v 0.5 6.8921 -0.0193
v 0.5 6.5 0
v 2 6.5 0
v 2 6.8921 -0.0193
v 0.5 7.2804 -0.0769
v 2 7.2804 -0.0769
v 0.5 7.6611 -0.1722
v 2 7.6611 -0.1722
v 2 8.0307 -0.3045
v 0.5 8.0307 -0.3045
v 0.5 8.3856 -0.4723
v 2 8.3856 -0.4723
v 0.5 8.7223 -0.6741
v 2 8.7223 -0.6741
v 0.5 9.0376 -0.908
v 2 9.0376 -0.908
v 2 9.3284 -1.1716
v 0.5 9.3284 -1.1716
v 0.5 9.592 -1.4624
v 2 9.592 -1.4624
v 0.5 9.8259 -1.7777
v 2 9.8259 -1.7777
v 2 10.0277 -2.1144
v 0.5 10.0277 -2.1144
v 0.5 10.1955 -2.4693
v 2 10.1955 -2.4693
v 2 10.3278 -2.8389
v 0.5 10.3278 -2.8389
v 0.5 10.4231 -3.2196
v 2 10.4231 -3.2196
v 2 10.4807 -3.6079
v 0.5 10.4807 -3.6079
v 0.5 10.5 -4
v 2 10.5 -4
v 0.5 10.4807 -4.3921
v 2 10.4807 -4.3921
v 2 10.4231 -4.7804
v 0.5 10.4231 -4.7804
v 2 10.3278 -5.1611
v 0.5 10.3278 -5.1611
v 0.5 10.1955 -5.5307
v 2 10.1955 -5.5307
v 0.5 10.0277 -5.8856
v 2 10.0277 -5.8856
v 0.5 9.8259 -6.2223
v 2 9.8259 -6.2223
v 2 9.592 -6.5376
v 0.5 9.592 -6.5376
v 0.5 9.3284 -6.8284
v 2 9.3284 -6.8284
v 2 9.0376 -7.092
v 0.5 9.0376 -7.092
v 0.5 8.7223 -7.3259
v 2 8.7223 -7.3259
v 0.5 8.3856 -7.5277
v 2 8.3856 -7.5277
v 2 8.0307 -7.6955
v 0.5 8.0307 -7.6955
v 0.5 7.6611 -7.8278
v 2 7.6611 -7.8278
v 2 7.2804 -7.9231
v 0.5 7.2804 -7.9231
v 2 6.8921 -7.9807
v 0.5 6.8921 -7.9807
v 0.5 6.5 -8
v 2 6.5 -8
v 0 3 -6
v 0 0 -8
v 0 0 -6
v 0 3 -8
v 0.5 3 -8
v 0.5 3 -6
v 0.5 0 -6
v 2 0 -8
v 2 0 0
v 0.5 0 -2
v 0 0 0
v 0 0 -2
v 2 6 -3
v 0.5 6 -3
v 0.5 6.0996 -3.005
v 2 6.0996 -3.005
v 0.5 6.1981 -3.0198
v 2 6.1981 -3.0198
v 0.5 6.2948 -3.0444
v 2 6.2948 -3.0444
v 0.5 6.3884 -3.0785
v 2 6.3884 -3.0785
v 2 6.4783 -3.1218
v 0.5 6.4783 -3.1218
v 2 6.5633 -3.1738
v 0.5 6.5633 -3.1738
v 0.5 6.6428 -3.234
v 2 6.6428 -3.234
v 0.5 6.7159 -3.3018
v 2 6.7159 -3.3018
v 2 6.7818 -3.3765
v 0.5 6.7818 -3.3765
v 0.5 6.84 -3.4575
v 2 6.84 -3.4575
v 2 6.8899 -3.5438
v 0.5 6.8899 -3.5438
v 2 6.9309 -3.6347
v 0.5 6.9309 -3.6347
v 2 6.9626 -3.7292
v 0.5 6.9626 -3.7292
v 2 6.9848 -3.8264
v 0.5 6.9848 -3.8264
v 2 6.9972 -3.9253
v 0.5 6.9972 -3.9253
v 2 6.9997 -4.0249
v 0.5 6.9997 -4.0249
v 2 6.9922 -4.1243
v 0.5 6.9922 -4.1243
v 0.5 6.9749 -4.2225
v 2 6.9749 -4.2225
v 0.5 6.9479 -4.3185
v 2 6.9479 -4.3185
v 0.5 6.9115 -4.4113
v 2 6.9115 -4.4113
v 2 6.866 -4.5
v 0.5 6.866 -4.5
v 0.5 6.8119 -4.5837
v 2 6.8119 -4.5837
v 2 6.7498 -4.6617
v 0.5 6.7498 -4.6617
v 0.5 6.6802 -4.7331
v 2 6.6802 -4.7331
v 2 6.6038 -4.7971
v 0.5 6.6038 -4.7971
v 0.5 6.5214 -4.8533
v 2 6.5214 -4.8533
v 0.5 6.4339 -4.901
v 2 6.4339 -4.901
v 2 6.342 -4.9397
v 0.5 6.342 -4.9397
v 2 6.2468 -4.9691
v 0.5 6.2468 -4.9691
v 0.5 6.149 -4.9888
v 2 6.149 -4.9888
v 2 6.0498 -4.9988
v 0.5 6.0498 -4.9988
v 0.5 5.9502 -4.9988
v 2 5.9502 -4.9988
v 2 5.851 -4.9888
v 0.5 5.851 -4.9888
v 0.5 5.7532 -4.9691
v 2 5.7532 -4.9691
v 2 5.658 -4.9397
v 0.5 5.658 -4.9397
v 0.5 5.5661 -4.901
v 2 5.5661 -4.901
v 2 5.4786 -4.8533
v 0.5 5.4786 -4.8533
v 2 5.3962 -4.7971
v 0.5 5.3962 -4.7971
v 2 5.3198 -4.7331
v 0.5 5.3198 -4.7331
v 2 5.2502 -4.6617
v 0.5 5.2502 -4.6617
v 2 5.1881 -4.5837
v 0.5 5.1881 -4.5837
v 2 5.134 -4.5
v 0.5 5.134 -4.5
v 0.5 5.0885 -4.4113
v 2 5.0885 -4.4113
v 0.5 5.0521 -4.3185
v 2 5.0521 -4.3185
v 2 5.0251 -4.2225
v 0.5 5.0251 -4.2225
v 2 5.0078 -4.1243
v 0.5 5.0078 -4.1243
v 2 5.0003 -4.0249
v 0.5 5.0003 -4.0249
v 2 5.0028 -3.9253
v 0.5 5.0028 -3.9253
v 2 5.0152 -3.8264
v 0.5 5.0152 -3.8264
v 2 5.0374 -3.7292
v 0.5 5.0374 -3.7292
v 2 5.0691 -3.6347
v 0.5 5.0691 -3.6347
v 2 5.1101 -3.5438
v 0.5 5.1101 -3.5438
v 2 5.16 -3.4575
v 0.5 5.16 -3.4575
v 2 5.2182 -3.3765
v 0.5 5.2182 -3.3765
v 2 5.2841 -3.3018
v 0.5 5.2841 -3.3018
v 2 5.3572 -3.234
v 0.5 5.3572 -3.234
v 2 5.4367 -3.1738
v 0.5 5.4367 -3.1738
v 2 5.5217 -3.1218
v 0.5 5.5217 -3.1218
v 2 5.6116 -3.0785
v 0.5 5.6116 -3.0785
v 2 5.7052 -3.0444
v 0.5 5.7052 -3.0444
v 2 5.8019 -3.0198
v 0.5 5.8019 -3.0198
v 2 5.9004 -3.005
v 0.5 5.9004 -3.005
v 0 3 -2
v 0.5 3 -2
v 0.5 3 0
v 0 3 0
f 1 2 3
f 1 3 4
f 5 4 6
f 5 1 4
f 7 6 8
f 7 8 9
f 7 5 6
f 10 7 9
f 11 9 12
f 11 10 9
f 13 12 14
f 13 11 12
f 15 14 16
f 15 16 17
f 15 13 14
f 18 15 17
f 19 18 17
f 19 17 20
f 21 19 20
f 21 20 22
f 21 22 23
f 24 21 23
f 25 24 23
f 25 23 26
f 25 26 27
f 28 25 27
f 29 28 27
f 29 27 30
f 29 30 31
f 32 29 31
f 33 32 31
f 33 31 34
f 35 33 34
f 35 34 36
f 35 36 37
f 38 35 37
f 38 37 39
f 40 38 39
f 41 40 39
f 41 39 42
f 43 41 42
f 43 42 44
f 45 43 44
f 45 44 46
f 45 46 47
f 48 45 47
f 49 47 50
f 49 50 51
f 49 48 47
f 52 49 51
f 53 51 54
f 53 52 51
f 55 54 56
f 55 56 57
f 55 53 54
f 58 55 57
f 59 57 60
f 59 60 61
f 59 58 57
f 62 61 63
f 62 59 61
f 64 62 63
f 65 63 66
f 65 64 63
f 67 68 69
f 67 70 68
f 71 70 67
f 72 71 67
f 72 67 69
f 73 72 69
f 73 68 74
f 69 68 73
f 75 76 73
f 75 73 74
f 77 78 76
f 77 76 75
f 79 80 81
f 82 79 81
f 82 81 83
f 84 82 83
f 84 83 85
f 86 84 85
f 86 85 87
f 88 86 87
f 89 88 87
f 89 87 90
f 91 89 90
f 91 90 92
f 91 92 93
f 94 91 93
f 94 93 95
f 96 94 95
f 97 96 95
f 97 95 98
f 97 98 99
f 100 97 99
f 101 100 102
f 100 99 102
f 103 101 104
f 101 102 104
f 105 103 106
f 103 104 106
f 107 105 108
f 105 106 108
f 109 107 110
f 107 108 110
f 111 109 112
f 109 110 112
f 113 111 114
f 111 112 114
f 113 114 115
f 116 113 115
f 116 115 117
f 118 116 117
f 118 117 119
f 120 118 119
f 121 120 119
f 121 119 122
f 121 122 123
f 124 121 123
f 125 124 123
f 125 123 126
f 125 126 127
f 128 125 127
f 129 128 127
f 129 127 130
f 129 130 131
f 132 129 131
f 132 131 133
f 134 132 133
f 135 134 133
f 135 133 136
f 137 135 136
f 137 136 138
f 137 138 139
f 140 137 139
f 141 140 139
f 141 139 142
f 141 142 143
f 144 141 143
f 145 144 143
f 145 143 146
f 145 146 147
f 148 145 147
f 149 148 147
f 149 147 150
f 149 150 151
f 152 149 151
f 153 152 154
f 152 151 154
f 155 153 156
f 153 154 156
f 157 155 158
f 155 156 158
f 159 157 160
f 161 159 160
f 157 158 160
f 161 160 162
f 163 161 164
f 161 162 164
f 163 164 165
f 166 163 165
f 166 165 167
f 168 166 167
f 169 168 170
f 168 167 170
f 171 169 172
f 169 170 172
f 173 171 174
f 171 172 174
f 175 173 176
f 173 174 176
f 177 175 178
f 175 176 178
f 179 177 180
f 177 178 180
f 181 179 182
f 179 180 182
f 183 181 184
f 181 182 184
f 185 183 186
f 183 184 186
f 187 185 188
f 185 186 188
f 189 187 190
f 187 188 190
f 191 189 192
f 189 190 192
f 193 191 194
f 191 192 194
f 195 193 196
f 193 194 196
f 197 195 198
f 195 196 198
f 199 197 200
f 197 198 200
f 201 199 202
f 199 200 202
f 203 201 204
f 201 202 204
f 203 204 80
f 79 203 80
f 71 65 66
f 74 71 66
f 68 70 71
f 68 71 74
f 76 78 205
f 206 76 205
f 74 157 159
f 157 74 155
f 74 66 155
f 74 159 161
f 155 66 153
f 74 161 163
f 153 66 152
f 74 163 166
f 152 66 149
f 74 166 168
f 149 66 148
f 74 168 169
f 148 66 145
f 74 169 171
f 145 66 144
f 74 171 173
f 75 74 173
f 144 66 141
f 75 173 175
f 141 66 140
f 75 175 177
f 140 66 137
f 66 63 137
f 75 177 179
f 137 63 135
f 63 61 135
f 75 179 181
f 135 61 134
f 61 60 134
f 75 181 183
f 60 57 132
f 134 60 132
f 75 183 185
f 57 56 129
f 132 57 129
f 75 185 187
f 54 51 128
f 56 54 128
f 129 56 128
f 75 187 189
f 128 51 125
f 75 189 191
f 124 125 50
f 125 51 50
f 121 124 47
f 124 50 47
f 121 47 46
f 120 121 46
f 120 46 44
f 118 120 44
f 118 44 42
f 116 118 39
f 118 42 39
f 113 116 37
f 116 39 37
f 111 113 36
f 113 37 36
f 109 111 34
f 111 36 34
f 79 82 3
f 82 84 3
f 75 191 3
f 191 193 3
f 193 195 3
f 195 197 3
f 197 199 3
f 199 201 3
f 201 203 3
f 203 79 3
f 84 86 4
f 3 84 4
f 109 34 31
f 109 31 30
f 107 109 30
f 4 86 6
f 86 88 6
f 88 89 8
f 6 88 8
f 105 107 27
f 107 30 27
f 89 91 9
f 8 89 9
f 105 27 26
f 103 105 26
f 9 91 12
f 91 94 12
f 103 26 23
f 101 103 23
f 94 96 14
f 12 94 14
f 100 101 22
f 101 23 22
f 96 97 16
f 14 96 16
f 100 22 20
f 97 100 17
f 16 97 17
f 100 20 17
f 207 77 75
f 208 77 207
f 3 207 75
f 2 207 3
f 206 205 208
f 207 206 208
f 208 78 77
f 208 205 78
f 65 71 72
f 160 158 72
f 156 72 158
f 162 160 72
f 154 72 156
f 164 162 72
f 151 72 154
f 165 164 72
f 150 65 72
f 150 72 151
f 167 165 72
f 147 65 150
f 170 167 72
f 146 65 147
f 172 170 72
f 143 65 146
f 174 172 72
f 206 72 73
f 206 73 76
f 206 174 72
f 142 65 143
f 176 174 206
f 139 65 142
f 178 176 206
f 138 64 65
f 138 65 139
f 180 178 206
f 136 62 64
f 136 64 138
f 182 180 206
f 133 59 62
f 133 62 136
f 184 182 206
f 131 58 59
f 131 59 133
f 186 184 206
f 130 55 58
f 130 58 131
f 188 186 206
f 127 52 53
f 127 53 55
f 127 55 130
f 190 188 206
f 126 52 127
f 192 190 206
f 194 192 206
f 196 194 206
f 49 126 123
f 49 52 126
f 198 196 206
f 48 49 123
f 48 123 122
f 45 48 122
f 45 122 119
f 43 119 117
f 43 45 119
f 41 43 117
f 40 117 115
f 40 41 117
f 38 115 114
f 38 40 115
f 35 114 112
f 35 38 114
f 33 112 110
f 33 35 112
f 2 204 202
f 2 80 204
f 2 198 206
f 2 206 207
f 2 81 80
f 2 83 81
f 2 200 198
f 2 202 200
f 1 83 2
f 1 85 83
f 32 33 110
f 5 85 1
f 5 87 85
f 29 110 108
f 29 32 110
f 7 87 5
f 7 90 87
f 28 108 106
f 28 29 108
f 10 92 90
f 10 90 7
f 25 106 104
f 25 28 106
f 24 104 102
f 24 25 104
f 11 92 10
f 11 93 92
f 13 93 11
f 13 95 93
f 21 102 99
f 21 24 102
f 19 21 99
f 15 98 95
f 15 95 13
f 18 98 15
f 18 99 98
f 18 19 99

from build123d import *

# Parameters (mm, degrees)
BOSS_EXTRUDE1_DEPTH = 2
CUT_EXTRUDE1_DEPTH  = 0.5
SKETCH3_R           = 1
CUT_EXTRUDE2_DEPTH  = 2.5


with BuildPart() as part:
    # Sketch1 → Boss-Extrude1 (new body)
    with BuildSketch(Plane(origin=(0, 0, 0), x_dir=(0, 0, -1), z_dir=(1, 0, 0))):
        with BuildLine():
            Line((0, 0), (0, 6.5))
            ThreePointArc((0, 6.5), (4, 10.5), (8, 6.5))
            Line((8, 6.5), (8, 0))
            Line((8, 0), (0, 0))
        make_face()
    extrude(amount=BOSS_EXTRUDE1_DEPTH)

    # Sketch2 → Cut-Extrude1 (cut)
    with BuildSketch(Plane.ZY):
        with BuildLine():
            Line((-8, 3), (-6, 3))
            Line((-6, 3), (-6, 0))
            Line((-6, 0), (-2, 0))
            Line((-2, 0), (-2, 3))
            Line((-2, 3), (0, 3))
            Line((0, 3), (0, 6.5))
            ThreePointArc((0, 6.5), (-4, 10.5), (-8, 6.5))
            Line((-8, 6.5), (-8, 3))
        make_face()
    extrude(amount=-CUT_EXTRUDE1_DEPTH, mode=Mode.SUBTRACT)

    # Sketch3 → Cut-Extrude2 (cut, through all)
    with BuildSketch(Plane.ZY.offset(-0.5)):
        with Locations((-4, 6)):
            Circle(SKETCH3_R)
    extrude(amount=-CUT_EXTRUDE2_DEPTH, mode=Mode.SUBTRACT)


solid = part.part
